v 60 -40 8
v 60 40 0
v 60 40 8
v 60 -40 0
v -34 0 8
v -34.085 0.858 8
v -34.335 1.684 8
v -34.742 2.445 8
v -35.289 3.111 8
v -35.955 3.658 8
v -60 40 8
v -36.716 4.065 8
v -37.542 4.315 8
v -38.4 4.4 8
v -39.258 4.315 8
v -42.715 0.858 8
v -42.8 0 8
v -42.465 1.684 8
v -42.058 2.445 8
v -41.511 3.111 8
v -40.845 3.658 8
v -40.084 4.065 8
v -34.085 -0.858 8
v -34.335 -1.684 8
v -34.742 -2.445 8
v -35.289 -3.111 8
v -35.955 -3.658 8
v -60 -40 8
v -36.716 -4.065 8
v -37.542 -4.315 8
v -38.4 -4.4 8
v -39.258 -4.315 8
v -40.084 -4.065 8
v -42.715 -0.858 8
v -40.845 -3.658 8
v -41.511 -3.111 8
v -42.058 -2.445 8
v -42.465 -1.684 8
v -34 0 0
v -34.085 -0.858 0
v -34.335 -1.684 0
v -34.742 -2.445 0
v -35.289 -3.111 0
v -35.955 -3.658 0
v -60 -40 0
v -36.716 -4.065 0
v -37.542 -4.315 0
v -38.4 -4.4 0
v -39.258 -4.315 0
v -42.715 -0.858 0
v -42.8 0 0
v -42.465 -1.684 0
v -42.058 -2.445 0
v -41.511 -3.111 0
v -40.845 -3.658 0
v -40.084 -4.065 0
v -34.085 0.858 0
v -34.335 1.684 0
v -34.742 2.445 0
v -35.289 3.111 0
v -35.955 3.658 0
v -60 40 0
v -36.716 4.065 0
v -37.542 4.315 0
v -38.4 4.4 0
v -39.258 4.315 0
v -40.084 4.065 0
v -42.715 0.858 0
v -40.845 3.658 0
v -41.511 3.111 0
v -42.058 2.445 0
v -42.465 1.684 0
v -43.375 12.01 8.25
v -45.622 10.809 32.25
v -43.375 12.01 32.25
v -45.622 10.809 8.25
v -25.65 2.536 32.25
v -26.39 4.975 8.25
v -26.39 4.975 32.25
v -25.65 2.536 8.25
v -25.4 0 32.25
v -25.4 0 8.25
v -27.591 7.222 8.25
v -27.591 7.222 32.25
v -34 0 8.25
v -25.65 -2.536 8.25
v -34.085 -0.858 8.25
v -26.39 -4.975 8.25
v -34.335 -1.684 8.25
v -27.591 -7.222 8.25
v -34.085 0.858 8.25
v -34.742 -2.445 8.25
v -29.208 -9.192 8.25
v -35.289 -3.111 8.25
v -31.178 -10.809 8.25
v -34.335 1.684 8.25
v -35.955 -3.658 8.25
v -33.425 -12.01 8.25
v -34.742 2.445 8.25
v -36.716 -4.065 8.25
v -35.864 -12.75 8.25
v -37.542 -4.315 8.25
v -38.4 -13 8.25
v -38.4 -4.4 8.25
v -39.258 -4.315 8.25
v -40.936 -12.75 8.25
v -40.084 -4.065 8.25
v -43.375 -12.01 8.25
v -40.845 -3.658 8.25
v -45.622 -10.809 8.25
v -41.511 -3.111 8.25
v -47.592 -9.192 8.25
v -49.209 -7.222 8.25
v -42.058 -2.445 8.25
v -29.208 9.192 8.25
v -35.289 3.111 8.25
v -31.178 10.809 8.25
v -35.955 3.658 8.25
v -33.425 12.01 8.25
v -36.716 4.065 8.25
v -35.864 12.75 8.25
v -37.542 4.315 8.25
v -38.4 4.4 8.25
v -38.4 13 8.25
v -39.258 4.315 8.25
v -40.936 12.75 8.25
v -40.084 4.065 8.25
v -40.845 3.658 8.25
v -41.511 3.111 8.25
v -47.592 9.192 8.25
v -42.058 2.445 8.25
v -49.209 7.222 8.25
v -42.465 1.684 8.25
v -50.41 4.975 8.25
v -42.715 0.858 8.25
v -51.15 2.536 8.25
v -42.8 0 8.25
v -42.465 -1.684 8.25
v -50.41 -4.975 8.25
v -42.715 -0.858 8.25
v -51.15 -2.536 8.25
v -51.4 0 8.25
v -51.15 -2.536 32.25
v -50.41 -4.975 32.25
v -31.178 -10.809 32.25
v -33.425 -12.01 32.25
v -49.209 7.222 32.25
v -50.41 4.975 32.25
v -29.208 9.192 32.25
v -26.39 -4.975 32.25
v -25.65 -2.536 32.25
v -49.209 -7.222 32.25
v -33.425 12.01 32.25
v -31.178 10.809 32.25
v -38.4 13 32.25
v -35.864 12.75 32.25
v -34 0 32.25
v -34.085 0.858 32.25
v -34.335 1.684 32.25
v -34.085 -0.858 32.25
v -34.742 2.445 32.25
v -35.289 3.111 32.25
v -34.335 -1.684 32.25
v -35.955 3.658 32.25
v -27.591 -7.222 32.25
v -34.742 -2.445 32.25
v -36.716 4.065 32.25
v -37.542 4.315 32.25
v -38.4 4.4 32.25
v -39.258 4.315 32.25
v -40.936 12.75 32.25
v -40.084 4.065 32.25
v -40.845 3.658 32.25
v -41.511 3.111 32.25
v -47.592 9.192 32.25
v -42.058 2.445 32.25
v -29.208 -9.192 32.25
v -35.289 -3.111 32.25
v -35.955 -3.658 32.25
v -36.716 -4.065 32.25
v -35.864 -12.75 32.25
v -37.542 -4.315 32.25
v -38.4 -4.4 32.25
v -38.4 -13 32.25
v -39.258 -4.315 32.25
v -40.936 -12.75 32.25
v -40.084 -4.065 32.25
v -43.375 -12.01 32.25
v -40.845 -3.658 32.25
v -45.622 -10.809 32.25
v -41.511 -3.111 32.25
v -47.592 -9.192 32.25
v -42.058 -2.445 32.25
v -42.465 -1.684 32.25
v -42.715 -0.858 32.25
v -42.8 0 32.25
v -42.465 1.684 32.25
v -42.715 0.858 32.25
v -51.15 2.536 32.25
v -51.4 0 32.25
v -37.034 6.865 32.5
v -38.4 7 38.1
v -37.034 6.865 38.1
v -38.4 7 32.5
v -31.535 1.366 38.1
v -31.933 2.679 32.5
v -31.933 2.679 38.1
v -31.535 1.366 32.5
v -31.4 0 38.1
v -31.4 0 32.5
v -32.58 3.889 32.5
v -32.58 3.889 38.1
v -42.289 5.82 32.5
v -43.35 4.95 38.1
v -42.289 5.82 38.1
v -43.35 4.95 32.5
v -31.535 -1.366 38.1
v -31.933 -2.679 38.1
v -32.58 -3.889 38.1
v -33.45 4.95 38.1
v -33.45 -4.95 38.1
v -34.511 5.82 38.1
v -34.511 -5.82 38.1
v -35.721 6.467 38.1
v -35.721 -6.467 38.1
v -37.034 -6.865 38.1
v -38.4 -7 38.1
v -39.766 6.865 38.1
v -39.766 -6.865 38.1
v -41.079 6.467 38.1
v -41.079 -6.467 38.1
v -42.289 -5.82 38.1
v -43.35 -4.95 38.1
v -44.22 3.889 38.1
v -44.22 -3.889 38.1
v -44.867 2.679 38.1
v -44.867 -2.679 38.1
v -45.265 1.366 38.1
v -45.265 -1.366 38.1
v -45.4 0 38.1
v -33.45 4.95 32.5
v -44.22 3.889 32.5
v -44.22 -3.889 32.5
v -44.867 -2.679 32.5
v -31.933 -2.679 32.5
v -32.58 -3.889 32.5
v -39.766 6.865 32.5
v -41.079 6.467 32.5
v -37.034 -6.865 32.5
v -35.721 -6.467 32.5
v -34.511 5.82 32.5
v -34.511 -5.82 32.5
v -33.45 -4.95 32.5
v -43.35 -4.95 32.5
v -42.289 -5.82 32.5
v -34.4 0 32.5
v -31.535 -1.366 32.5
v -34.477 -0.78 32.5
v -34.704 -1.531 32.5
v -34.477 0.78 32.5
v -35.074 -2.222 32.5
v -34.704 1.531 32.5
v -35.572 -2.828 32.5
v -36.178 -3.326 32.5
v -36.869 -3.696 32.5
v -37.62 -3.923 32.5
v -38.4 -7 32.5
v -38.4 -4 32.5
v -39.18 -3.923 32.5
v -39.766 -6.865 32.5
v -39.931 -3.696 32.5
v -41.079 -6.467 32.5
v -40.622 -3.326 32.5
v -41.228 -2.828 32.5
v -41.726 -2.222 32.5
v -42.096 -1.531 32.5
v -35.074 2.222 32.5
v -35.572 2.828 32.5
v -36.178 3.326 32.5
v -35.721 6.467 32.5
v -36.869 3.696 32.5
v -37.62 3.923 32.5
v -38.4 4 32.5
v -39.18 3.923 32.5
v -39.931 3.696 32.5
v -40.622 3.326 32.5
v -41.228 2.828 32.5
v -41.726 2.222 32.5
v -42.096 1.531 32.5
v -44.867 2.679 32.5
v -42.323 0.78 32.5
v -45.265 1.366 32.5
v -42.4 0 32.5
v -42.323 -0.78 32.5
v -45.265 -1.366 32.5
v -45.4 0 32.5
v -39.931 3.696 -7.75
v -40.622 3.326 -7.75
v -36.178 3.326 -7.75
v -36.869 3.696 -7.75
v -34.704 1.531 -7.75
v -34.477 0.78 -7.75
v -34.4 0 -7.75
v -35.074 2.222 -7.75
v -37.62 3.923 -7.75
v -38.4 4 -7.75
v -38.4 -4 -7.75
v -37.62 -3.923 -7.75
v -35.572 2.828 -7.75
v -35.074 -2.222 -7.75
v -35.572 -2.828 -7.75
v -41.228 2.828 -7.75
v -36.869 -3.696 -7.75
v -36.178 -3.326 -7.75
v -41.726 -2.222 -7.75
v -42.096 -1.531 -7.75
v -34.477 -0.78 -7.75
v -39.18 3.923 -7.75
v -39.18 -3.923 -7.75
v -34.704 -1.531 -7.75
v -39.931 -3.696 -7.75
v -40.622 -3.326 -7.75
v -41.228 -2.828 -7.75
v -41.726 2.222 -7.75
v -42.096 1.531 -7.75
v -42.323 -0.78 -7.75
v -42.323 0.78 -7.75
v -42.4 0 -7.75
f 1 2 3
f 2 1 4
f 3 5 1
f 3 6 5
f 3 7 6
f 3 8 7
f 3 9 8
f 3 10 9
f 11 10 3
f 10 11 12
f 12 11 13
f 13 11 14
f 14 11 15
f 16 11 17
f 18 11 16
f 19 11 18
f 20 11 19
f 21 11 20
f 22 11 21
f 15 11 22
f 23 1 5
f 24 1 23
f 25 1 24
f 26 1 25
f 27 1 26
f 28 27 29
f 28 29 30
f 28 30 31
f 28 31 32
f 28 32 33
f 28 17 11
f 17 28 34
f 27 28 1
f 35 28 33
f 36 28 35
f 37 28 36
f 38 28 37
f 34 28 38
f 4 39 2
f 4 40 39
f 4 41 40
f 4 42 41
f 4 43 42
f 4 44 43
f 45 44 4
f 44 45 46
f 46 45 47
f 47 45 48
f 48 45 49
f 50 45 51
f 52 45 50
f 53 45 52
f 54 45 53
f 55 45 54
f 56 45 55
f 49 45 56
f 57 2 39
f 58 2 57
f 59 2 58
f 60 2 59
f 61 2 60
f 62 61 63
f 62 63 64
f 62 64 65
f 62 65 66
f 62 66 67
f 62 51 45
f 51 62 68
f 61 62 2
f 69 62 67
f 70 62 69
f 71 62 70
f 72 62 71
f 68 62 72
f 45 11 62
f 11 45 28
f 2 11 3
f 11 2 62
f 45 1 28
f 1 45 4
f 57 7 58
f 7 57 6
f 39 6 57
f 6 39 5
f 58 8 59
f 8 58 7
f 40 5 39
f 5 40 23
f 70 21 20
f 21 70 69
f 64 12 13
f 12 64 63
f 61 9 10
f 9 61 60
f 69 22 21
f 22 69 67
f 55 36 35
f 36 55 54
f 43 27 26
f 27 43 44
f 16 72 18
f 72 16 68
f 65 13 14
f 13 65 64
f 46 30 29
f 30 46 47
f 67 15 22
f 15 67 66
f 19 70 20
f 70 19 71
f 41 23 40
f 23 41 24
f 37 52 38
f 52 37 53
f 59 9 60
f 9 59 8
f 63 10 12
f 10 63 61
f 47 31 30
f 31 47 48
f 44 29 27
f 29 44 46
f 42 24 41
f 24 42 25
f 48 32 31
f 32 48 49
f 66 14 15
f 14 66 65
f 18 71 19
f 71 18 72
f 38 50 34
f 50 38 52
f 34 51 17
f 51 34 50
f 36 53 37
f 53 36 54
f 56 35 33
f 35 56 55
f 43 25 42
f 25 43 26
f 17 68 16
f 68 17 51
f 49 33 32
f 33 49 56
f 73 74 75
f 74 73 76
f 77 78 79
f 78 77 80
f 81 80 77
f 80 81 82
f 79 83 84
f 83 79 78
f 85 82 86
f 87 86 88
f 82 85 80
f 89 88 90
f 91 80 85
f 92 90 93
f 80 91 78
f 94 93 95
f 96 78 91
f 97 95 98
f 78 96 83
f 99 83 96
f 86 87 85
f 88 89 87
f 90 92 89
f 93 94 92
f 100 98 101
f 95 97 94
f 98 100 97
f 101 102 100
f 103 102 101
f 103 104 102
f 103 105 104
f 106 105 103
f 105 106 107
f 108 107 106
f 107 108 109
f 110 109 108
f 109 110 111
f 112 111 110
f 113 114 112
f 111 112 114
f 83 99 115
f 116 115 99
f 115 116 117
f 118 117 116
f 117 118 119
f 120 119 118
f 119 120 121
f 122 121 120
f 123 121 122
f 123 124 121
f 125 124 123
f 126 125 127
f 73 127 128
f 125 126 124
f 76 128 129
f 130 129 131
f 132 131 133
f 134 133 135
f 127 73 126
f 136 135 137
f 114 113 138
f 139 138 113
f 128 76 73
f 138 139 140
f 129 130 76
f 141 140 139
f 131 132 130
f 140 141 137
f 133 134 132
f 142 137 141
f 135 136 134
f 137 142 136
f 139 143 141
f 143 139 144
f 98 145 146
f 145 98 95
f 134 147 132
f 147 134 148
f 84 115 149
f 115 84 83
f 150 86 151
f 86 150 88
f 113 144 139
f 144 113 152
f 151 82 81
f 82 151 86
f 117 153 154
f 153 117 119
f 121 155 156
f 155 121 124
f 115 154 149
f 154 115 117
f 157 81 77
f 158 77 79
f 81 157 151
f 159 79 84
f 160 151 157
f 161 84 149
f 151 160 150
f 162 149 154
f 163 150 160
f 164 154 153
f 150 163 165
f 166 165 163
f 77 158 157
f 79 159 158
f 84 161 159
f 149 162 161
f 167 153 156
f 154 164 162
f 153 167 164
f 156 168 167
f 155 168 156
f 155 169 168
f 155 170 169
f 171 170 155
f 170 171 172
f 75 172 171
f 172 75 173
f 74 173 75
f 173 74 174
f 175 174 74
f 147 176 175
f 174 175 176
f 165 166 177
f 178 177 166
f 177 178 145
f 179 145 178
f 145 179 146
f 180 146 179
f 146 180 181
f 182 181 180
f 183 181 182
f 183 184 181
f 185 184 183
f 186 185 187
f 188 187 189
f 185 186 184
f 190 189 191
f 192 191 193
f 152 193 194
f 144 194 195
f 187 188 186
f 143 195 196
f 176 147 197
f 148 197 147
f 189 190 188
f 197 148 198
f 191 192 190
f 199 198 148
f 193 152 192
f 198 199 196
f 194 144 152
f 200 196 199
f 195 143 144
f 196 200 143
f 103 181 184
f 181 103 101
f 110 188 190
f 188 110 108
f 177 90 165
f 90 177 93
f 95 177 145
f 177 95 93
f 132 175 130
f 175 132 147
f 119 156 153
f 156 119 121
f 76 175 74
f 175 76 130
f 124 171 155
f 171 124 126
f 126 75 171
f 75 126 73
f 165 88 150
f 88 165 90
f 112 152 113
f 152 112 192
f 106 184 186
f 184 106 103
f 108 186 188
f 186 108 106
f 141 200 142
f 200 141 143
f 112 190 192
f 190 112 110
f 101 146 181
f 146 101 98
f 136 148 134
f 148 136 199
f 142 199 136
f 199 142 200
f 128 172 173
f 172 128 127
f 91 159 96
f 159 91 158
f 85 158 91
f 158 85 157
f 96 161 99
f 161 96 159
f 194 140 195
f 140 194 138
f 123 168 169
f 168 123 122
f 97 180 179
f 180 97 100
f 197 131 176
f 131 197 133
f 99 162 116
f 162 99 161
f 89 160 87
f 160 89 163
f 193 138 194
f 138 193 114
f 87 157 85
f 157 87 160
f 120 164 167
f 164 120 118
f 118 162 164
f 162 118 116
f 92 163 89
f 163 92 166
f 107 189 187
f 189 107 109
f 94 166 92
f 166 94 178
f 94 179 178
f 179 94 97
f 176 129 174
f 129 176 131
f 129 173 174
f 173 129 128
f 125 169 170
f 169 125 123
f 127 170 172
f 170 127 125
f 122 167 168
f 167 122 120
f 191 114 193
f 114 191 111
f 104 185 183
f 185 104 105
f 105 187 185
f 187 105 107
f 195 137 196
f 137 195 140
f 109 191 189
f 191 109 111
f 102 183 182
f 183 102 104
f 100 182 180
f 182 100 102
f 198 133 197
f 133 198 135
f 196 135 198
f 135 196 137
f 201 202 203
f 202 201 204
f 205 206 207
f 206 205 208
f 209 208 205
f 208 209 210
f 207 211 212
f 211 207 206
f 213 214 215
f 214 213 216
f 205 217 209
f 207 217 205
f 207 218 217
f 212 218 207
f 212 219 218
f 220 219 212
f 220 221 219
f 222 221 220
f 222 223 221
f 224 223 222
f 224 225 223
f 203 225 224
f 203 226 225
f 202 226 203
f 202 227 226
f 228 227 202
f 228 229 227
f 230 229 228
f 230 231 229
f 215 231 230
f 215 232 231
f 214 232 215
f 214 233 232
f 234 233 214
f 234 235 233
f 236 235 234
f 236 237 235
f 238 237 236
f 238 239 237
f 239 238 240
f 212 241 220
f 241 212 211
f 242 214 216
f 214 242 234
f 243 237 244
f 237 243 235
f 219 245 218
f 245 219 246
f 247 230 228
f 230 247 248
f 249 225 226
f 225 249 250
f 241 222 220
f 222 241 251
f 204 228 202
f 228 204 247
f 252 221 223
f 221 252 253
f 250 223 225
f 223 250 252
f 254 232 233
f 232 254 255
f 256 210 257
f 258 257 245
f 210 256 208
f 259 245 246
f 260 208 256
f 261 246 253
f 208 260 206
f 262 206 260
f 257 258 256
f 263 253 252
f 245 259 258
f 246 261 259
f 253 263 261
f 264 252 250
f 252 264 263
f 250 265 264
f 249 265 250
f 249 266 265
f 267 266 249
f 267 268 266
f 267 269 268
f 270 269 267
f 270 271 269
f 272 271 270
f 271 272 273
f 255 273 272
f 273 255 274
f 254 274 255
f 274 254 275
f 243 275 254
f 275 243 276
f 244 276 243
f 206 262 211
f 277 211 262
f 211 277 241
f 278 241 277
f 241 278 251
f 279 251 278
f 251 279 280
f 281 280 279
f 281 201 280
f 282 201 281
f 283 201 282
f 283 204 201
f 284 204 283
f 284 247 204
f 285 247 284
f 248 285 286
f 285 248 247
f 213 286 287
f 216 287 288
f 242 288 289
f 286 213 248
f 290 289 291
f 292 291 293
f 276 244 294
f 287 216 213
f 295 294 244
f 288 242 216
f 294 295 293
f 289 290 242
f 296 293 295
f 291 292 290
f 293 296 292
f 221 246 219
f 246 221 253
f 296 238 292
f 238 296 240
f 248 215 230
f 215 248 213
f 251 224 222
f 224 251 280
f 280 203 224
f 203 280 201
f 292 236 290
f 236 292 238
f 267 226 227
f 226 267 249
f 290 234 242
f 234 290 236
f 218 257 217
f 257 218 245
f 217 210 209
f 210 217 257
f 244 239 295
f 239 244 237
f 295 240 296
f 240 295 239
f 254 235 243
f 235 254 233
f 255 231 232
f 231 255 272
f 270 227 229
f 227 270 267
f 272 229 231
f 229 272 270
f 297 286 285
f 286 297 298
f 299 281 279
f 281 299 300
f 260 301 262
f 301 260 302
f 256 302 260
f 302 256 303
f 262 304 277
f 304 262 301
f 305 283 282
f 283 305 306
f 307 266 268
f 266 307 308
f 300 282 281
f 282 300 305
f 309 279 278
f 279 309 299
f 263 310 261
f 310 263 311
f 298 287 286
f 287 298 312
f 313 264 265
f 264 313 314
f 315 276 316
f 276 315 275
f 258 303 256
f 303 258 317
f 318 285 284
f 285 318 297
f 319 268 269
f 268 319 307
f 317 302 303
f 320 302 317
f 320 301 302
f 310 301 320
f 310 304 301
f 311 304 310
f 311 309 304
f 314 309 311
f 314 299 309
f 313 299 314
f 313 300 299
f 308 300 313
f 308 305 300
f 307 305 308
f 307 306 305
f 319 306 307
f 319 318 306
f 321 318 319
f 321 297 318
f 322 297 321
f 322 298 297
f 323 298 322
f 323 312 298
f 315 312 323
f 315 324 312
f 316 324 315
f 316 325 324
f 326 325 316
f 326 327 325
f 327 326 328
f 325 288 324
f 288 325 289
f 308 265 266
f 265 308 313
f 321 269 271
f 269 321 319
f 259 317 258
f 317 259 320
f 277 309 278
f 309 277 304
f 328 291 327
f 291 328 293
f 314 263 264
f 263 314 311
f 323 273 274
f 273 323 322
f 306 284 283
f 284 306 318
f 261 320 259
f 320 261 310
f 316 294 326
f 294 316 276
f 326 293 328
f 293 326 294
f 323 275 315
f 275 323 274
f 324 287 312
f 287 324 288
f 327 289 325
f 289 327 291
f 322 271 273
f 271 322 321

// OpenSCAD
$fn = 32;

// ------------------------------------------------------------------------
// Standoff columns: 1 d26 standoffs, bolts d8
// Every part is its own module, assembly() places them once.
// ------------------------------------------------------------------------

// --- part 1 ---
module base_plate() {
  difference() {
    translate([-60, -40, 0]) cube([120, 80, 8]);
    translate([-38.4, 0, -1]) cylinder(h = 10, d = 8.8);
  }
}

// --- part 2 ---
module spacer() {
  difference() {
      translate([0, 0, 0]) cylinder(h = 24, d = 26);
      translate([0, 0, -1]) cylinder(h = 26, d = 8.8);
    }
}

// --- part 3 ---
module bolt() {
  cylinder(h = 5.6, d = 14);
  translate([0, 0, -40.25]) cylinder(h = 40.25, d = 8);
}

// --- assembly ---
module assembly() {
  translate([0, 0, 0]) rotate([0, 0, 0]) base_plate();
  translate([-38.4, 0, 8.25]) rotate([0, 0, 0]) spacer();
  translate([-38.4, 0, 32.5]) rotate([0, 0, 0]) bolt();
}

assembly();
